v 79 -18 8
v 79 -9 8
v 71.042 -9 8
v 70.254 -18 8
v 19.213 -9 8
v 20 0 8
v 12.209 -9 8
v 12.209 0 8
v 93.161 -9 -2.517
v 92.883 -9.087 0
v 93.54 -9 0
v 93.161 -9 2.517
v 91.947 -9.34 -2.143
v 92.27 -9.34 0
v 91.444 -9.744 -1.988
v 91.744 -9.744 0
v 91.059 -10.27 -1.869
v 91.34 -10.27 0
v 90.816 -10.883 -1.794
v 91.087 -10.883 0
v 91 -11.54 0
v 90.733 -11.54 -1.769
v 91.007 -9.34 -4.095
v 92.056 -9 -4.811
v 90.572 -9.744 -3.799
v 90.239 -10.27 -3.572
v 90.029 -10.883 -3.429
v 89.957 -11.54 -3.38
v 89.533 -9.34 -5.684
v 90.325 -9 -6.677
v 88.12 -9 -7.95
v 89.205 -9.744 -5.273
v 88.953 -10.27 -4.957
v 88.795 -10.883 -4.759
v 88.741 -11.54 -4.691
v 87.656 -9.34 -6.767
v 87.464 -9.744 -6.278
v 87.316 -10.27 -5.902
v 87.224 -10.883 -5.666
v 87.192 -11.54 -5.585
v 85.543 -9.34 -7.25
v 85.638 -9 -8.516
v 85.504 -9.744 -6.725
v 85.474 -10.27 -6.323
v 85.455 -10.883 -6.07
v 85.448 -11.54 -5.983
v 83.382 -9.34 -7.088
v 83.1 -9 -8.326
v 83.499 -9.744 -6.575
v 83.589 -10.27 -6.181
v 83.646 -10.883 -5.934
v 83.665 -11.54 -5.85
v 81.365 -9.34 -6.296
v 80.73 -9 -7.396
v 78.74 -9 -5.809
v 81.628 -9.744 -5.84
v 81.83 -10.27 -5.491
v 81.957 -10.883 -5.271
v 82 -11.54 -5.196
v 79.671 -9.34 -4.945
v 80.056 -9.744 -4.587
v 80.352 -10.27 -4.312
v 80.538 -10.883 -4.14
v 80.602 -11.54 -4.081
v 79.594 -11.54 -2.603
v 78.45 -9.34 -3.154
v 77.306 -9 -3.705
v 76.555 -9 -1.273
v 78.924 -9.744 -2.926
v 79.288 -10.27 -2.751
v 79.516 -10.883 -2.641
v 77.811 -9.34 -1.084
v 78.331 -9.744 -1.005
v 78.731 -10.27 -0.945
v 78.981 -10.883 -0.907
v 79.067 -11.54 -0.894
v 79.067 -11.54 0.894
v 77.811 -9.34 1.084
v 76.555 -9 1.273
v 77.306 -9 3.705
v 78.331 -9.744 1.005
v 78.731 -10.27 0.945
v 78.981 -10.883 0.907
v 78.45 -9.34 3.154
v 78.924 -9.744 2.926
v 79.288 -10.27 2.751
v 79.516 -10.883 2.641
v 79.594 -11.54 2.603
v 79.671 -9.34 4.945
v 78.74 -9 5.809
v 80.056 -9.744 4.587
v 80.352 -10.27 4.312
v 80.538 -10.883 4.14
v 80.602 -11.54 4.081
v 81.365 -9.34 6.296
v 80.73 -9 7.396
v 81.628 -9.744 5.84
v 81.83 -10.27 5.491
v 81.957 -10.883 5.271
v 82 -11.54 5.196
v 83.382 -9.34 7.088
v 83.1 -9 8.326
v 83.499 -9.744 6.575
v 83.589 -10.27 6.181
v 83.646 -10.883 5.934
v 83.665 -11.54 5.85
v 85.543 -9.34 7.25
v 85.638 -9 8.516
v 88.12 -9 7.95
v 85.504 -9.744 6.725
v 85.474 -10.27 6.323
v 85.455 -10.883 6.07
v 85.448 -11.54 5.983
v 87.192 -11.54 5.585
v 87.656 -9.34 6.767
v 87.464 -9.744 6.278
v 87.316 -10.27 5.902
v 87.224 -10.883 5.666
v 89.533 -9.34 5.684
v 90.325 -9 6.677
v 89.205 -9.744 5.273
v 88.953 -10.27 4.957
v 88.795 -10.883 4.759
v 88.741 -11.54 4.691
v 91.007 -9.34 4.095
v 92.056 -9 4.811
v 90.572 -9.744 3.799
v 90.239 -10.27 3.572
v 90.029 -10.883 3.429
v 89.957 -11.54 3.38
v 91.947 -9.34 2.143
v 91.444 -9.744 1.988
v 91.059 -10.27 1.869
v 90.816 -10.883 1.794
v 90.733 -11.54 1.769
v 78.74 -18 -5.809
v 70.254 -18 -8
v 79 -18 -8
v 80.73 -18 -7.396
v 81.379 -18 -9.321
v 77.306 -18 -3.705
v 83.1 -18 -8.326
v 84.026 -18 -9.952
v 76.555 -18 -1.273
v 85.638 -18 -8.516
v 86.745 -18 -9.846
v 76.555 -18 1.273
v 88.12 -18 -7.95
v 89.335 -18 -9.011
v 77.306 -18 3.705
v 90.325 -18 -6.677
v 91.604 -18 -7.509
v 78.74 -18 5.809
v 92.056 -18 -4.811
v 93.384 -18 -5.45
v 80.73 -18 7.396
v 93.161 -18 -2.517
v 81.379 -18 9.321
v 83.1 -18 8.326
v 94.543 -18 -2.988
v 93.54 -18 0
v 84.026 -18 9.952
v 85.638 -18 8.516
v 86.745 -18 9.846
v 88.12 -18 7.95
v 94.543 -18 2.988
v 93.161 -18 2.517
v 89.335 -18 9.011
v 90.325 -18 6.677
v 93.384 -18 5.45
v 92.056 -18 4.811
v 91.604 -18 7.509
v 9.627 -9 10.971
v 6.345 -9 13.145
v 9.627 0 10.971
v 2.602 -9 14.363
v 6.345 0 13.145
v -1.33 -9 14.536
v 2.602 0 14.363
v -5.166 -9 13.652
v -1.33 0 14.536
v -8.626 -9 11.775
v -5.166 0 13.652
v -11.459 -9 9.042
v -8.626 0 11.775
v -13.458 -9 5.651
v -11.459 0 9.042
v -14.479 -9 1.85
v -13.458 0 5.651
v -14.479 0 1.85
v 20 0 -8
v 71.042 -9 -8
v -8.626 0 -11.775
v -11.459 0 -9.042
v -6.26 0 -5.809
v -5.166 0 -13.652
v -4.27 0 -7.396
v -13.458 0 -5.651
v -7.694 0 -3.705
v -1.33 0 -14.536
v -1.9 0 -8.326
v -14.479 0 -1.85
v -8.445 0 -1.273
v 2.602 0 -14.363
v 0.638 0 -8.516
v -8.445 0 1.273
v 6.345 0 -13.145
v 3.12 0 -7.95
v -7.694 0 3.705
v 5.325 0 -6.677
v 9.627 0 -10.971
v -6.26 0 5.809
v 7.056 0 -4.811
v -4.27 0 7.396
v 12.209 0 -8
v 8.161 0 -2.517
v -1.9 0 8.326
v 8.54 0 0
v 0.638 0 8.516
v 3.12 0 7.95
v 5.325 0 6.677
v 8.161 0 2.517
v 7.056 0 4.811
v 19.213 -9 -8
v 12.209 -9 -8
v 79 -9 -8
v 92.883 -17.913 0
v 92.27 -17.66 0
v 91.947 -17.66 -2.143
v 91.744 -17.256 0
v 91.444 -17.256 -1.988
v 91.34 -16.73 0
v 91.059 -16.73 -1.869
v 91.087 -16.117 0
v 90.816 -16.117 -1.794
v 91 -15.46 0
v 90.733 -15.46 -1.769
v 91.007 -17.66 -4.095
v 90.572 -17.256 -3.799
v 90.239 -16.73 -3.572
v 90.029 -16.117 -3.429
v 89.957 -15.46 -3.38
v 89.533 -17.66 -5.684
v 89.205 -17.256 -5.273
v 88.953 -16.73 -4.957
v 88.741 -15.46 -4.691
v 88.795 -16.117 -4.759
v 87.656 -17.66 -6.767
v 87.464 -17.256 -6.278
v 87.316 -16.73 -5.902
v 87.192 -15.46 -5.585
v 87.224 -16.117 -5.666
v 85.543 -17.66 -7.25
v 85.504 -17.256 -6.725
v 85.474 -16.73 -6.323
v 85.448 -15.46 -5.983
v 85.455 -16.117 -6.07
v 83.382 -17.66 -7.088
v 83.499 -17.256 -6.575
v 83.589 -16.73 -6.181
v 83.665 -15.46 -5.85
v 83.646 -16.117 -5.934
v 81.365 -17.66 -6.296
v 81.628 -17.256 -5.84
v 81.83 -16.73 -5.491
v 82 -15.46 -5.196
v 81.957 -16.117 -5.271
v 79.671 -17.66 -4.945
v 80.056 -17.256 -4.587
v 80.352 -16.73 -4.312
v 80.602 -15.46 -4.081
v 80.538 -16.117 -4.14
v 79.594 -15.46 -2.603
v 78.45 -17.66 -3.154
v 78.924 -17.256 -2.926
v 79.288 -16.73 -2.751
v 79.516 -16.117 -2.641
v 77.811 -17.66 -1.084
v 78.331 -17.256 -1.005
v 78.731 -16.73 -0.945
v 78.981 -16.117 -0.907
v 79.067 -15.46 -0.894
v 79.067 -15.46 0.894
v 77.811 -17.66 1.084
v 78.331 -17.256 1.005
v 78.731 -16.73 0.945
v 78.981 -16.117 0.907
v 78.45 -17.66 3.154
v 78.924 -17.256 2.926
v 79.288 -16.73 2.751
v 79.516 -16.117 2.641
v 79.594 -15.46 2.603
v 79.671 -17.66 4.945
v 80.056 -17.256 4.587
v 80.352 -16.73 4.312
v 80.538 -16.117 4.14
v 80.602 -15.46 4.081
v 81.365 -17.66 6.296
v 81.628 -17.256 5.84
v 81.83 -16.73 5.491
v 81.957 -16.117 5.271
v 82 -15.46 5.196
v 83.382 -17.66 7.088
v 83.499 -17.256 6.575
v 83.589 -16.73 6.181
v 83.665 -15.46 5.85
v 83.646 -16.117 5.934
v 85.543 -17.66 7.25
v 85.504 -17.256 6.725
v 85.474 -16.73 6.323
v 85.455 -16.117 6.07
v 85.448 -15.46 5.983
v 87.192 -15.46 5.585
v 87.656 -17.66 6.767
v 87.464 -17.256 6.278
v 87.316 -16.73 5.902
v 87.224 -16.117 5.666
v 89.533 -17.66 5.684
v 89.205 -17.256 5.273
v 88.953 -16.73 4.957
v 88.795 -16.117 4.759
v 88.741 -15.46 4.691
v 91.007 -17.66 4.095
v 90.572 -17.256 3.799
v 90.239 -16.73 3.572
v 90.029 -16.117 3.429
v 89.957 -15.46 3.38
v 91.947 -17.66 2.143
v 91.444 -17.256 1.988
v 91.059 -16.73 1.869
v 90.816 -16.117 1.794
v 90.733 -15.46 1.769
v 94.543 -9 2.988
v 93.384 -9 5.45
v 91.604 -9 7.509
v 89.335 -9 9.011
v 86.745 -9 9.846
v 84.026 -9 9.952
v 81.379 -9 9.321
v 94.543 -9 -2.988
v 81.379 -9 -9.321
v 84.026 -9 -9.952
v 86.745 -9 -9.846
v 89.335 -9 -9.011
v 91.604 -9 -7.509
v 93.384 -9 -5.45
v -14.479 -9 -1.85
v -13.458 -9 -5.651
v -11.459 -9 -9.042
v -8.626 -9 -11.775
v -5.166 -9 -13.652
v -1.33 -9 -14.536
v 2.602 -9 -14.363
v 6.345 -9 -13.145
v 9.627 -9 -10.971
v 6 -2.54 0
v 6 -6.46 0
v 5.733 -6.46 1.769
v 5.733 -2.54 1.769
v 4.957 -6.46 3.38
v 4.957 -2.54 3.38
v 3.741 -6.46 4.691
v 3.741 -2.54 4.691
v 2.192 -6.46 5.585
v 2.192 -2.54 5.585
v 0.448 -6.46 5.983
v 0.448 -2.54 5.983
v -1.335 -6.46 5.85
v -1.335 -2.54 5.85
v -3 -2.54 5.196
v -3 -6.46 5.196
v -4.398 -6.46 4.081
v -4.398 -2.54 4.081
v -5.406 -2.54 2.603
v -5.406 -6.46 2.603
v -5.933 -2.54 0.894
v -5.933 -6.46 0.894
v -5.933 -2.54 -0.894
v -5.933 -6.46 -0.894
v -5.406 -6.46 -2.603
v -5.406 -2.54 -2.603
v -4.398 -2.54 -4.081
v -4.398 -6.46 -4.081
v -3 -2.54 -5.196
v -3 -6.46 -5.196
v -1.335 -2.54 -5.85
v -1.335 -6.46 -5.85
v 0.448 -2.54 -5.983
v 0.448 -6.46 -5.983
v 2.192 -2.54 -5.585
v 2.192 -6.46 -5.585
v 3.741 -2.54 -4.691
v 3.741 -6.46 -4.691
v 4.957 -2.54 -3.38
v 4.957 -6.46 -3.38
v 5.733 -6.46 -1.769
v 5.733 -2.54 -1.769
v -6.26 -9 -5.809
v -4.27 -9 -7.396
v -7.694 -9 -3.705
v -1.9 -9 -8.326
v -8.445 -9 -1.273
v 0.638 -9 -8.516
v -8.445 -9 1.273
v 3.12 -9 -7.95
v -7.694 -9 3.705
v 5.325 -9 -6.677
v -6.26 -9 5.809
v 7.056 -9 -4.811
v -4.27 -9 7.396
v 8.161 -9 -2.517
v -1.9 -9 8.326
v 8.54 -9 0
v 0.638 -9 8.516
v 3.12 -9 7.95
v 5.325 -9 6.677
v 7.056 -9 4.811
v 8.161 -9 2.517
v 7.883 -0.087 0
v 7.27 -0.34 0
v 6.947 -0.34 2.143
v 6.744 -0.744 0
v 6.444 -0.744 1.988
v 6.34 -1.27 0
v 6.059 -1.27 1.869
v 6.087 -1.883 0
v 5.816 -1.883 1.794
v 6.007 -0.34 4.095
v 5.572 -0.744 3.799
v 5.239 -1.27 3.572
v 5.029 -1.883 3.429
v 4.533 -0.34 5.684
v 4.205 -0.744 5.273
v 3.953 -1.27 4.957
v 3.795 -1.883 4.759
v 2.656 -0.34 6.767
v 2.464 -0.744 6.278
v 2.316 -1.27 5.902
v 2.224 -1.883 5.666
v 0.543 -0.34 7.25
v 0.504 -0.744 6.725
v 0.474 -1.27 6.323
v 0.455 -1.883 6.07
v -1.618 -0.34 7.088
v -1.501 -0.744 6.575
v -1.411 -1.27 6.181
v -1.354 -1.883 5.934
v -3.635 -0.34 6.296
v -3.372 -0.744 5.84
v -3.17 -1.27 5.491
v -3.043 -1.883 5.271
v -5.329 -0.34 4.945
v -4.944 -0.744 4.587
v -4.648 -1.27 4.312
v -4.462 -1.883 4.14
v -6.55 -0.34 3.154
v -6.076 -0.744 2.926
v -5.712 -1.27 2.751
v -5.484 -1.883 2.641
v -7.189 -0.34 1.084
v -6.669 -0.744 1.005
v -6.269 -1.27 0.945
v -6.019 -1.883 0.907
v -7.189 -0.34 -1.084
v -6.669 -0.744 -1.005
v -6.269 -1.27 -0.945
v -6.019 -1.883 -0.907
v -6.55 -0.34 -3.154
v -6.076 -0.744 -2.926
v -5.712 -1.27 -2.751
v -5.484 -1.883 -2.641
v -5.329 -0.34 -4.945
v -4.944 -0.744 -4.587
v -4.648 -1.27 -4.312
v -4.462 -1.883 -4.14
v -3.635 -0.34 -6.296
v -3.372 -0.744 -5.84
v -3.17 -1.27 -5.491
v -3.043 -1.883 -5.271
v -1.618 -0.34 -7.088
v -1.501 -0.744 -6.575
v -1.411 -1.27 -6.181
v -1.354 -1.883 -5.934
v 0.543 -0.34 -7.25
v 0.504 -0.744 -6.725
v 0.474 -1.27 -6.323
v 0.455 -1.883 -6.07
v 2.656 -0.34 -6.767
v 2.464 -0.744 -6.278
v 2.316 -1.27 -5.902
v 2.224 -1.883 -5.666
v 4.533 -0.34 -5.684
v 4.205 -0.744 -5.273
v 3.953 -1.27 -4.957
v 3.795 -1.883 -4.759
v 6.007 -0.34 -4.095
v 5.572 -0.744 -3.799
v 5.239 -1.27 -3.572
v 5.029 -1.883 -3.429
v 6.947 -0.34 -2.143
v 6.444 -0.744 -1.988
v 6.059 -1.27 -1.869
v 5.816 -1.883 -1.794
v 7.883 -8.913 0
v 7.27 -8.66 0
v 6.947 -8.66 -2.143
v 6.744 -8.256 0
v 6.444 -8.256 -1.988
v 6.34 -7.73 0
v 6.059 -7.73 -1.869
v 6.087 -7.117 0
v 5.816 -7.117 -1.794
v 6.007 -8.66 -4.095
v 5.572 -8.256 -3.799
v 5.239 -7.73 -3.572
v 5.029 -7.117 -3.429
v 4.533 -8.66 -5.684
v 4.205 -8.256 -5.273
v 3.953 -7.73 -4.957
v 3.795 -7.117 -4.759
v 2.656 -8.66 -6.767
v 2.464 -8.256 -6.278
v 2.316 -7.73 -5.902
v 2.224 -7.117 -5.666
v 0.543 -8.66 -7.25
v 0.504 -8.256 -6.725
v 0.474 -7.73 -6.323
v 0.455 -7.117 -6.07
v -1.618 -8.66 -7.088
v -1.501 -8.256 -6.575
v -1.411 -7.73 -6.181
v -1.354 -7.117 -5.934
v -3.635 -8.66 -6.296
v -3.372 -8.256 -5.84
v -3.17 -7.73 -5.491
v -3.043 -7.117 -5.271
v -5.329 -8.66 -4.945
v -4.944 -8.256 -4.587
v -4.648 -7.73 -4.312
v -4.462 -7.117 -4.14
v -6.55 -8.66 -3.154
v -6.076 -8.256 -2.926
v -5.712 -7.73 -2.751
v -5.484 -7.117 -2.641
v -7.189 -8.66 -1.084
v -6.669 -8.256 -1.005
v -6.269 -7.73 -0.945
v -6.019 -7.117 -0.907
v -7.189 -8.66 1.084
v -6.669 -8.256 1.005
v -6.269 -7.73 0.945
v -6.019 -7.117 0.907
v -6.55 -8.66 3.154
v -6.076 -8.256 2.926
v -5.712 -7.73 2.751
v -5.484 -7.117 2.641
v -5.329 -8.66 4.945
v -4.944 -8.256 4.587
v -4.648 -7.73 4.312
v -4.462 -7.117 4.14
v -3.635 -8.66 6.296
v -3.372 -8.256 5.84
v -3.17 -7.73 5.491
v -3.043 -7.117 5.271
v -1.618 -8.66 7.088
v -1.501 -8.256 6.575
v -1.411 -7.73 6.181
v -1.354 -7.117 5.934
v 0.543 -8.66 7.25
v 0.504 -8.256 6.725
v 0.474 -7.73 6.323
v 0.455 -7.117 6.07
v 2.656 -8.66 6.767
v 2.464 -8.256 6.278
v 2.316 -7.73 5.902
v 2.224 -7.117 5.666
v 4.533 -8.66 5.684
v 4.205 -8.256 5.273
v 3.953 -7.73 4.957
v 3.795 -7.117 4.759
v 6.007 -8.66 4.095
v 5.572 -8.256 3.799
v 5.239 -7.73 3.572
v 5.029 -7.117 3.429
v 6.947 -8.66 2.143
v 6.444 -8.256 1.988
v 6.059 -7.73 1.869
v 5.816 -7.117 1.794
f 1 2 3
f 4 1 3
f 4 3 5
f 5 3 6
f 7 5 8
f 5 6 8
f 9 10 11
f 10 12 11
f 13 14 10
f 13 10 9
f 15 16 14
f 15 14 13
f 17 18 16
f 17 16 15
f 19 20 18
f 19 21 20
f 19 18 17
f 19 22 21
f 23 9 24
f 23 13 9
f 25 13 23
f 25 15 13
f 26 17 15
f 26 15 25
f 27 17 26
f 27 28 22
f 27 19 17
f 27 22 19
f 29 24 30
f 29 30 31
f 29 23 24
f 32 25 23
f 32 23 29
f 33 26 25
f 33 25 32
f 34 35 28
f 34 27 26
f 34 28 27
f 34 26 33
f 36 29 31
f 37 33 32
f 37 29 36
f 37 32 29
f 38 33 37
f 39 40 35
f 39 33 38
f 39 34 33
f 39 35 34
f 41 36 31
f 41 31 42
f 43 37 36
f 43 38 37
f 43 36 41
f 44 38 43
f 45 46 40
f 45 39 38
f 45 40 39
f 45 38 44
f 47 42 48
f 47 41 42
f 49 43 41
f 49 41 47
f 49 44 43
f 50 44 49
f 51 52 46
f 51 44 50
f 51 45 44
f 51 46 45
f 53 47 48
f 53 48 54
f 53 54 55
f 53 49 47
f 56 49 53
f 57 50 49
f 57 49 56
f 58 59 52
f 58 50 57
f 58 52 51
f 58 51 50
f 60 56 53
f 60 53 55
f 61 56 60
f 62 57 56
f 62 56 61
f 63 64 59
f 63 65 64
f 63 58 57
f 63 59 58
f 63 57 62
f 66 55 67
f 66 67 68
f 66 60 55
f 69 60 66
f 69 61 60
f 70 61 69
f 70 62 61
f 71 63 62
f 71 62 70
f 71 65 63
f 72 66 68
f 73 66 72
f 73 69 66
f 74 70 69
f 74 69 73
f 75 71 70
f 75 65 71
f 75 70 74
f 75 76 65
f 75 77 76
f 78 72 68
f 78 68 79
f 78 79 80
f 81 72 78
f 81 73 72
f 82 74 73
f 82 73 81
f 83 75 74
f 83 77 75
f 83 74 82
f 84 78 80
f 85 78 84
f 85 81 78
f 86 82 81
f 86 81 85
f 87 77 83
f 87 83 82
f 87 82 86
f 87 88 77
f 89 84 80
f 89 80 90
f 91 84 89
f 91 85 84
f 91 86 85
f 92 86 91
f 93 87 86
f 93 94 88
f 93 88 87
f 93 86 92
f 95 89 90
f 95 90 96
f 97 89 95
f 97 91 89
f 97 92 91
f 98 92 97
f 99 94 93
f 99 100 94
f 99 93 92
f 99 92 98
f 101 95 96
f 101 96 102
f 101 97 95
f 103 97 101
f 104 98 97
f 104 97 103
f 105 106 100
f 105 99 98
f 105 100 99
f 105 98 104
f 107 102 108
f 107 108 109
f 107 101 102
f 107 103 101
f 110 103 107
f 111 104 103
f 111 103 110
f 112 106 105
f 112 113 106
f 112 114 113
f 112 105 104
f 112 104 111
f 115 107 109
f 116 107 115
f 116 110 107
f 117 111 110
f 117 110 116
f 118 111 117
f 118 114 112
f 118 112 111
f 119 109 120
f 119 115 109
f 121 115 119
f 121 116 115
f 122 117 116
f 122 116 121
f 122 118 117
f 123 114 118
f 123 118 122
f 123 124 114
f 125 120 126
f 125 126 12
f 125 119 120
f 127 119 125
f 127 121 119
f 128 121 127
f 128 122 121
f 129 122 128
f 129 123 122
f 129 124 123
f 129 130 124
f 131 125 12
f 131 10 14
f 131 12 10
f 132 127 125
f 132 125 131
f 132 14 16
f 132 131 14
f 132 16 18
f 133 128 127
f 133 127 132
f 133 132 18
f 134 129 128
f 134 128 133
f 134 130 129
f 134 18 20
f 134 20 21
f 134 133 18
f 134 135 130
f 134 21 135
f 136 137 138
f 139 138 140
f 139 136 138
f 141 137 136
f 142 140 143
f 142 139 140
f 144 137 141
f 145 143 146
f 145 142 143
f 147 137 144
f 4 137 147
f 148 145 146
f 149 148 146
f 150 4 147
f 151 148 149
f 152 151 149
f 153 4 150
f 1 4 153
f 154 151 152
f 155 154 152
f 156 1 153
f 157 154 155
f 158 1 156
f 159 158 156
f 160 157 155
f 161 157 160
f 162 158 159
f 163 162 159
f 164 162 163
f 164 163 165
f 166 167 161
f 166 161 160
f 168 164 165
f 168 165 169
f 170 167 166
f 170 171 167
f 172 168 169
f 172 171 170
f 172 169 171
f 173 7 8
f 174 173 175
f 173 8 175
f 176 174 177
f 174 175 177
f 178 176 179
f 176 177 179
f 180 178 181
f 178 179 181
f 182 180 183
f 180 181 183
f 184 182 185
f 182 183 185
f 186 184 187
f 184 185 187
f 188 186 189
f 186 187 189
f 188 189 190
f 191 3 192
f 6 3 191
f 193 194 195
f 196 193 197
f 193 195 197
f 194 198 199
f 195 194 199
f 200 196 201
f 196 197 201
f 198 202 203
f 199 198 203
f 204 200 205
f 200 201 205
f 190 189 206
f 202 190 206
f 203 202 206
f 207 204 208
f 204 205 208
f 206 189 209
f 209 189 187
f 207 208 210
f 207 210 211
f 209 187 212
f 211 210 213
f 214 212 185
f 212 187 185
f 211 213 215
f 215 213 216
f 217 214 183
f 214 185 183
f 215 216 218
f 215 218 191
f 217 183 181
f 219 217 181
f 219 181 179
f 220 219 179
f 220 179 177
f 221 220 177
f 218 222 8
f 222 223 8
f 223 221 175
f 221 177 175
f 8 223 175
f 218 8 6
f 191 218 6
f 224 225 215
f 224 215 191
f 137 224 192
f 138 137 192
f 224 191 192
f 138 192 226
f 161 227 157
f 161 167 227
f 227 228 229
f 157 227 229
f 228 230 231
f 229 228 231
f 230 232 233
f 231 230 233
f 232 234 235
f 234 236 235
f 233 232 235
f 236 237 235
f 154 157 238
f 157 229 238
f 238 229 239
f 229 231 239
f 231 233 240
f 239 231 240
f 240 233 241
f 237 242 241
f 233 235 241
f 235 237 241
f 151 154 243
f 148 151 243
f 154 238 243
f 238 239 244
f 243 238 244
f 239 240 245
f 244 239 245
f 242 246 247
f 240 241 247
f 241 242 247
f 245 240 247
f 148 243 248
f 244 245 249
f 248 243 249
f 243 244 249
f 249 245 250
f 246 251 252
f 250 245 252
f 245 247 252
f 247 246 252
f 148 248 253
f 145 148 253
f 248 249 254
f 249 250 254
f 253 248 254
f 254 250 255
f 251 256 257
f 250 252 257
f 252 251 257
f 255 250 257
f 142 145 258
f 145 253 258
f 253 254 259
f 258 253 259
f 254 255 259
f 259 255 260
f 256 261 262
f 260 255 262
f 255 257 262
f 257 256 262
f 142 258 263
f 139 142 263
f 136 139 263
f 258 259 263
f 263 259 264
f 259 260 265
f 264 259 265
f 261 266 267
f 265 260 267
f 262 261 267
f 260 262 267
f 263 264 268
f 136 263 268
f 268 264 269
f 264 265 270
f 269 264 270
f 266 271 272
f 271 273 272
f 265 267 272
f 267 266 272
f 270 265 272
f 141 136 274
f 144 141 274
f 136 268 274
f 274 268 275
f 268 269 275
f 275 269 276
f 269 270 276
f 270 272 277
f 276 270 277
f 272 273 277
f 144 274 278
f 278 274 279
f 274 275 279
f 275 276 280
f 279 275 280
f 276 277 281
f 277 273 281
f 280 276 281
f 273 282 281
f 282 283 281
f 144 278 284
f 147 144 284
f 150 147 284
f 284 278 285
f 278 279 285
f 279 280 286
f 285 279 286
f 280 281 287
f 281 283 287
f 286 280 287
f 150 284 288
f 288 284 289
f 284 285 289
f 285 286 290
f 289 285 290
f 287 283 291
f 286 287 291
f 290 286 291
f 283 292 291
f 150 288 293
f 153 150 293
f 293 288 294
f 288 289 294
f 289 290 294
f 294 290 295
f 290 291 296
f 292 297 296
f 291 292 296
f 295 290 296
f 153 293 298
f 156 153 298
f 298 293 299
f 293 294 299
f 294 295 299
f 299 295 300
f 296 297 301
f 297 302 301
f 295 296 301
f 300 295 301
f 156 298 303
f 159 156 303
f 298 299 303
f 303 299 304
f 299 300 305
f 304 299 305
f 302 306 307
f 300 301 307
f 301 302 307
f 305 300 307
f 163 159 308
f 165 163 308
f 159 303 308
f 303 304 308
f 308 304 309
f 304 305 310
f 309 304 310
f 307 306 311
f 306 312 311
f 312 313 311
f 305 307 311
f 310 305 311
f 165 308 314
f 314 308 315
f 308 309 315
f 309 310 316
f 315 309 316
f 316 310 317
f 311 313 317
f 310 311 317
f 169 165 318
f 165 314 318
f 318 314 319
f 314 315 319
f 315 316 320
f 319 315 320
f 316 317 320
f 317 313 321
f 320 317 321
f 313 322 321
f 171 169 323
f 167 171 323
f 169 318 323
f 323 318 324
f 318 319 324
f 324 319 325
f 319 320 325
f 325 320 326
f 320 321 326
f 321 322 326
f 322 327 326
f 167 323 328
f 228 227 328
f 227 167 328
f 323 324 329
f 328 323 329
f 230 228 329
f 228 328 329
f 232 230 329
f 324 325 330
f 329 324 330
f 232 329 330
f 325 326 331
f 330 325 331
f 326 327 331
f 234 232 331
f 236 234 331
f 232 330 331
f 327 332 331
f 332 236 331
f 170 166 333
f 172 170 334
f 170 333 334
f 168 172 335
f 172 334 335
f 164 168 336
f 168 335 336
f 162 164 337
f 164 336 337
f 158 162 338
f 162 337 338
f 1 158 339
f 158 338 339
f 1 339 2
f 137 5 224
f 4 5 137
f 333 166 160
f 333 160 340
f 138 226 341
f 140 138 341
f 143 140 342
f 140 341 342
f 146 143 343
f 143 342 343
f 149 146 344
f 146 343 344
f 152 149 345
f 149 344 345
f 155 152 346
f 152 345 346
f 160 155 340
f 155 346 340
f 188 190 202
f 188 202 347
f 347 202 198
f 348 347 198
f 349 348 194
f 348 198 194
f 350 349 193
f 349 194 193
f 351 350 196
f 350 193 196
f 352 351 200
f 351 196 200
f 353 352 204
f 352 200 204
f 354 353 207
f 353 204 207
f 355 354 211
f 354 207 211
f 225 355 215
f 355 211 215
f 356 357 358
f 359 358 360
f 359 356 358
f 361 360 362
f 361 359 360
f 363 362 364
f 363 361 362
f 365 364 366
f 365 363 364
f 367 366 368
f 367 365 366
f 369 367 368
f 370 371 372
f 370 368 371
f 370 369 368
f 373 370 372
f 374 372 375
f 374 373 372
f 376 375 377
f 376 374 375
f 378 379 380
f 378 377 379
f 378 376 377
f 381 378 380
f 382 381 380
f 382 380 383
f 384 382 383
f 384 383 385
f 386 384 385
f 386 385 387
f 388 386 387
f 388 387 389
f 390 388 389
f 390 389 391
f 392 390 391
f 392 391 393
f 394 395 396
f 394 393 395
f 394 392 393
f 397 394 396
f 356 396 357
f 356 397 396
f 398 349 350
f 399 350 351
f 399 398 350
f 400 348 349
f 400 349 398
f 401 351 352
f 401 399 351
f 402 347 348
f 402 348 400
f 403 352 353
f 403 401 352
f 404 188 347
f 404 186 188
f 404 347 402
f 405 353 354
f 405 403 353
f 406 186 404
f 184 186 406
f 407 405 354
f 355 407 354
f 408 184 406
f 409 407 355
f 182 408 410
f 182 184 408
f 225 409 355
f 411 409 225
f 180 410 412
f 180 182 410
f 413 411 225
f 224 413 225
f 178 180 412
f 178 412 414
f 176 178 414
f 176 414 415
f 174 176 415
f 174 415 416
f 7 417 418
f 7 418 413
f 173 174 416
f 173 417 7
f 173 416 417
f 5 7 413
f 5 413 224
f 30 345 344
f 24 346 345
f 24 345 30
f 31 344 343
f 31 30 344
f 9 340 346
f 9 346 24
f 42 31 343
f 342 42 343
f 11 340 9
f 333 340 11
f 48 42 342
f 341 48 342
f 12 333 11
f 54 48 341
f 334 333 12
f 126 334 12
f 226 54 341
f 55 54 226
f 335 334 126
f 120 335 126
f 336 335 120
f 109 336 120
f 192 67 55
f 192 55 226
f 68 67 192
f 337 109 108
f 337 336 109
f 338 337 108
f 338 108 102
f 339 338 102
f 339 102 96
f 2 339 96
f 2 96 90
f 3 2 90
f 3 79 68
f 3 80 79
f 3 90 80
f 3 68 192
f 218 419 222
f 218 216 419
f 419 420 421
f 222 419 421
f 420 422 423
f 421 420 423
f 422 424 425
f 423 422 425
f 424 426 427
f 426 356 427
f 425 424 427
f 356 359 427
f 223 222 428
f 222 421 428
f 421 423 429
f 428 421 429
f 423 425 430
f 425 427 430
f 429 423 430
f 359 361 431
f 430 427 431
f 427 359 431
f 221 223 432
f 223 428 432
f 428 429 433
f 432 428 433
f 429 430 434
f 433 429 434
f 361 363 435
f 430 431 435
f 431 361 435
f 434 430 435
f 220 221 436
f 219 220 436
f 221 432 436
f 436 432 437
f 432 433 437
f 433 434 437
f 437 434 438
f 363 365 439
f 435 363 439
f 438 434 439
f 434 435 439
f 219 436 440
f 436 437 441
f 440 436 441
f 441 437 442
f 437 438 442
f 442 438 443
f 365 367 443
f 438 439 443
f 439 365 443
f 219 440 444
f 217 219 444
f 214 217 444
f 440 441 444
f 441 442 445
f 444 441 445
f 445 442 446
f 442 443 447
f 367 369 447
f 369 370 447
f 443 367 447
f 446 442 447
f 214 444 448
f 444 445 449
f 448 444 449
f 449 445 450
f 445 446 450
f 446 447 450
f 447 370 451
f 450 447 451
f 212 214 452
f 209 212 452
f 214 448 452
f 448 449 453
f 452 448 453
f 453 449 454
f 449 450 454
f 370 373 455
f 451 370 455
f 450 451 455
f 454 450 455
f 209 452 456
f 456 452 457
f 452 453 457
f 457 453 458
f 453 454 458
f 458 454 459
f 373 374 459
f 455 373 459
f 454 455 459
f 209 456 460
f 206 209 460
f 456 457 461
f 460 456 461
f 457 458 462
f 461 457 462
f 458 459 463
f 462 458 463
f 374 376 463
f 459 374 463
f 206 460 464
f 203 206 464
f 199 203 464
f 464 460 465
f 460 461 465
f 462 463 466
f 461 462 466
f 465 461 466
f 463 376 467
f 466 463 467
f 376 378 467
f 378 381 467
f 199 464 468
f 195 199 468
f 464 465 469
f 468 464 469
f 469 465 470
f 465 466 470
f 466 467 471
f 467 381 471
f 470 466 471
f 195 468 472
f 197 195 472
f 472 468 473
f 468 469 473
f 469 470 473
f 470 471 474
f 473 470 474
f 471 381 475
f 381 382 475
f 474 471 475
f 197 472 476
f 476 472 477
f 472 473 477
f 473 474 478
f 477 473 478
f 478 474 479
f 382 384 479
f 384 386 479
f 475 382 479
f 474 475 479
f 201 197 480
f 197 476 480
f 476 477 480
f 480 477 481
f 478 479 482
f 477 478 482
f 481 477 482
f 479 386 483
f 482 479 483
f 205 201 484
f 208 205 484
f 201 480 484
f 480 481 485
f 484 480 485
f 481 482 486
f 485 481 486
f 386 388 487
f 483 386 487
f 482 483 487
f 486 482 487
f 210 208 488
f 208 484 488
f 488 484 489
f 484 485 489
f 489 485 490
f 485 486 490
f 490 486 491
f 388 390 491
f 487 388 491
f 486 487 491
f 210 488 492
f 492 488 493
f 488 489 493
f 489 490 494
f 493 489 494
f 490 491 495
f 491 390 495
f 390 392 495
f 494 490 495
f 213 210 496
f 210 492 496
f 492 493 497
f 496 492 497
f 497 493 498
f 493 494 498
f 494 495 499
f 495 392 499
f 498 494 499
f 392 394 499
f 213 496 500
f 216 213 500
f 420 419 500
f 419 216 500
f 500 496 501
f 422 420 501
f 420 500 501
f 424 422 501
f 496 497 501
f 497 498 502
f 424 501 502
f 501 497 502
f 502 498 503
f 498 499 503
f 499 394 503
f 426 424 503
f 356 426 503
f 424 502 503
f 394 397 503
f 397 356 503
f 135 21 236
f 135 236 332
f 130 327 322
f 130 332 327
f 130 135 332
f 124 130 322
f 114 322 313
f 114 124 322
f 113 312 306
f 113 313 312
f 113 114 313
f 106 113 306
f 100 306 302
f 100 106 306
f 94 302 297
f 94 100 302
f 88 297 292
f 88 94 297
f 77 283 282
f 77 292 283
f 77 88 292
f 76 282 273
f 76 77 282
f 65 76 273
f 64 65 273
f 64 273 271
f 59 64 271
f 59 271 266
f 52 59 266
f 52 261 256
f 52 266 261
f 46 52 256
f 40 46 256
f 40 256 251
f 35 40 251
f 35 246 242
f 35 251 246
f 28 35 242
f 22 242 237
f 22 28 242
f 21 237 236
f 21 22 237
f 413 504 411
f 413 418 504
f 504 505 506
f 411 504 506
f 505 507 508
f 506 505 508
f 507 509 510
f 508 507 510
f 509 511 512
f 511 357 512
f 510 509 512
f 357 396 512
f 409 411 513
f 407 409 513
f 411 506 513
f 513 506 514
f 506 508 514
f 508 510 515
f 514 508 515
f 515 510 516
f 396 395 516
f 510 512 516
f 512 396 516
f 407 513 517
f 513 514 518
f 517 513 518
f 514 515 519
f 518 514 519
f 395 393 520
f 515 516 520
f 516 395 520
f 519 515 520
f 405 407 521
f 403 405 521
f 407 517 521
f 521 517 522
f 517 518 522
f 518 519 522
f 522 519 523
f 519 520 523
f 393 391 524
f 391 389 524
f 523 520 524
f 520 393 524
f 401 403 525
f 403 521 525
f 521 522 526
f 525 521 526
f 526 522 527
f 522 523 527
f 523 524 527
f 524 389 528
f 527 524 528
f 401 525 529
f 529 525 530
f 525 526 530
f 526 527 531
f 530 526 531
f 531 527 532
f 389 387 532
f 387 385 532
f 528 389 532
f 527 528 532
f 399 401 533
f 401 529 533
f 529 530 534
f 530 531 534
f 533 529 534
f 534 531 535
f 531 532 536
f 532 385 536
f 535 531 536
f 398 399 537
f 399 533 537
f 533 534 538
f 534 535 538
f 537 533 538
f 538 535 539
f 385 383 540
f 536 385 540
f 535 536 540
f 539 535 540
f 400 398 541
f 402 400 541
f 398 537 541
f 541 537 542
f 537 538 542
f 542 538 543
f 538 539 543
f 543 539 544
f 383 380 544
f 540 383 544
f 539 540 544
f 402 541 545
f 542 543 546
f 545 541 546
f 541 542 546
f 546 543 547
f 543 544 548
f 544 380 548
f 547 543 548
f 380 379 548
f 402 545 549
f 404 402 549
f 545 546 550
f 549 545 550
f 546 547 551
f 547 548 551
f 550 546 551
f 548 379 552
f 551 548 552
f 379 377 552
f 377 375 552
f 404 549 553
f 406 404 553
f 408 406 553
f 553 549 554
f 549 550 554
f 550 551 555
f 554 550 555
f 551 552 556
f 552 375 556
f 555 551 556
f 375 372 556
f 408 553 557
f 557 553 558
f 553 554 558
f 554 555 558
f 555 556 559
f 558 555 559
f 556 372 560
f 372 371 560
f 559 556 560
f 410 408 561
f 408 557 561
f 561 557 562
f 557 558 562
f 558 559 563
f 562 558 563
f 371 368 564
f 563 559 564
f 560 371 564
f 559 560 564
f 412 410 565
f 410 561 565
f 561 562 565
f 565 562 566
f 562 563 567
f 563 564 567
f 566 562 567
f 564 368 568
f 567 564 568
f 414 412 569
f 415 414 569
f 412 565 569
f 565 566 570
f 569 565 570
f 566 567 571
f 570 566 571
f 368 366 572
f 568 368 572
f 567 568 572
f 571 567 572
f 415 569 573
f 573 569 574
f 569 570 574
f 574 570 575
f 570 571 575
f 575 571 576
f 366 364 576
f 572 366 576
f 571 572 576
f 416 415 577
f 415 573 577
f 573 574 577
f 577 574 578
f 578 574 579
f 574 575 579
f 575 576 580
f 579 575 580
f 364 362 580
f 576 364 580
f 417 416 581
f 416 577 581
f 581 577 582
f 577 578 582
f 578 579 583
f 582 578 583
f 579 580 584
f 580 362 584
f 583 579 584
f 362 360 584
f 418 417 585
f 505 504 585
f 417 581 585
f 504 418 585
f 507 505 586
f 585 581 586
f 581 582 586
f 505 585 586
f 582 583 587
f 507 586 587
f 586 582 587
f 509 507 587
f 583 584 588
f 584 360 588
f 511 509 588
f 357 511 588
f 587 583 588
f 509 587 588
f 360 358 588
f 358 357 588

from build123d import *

# Parameters (mm, degrees)
F0_R     = 6
F1_DEPTH = 25
F3_DEPTH = 317.5
F4_R     = 2.54


with BuildPart() as f1:
    # F0 (on Front) → F1 (new body)
    with BuildSketch(Plane.XZ):
        with BuildLine():
            ThreePointArc((12.2088000741, -8), (13.9867667719, -4.1743448012), (14.59639679, 0))
            ThreePointArc((14.59639679, 0), (13.9867667719, 4.1743448012), (12.2088000741, 8))
            ThreePointArc((12.2088000741, 8), (-14.59639679, 0), (12.2088000741, -8))
        make_face()
        Circle(F0_R, mode=Mode.SUBTRACT)
        with BuildLine():
            ThreePointArc((12.2088000741, 8), (13.9867667719, 4.1743448012), (14.59639679, 0))
            ThreePointArc((14.59639679, 0), (13.9867667719, -4.1743448012), (12.2088000741, -8))
            Line((12.2088000741, -8), (79, -8))
            ThreePointArc((79, -8), (75, 0), (79, 8))
            Line((79, 8), (12.2088000741, 8))
        make_face()
        with BuildLine():
            ThreePointArc((95, 0), (89.472135955, 8.94427191), (79, 8))
            ThreePointArc((79, 8), (75, 0), (79, -8))
            ThreePointArc((79, -8), (89.472135955, -8.94427191), (95, 0))
        make_face()
        with Locations((85, 0)):
            Circle(F0_R, mode=Mode.SUBTRACT)
    extrude(amount=F1_DEPTH)

    # F2 (on Top) → F3 (intersect, symmetric)
    with BuildSketch(Plane.XY):
        Polygon((20, 0), (-14.4787151366, 0), (-14.4787151366, -9), (19.2126020283, -9), (70.2541384048, -18), (94.5431698973, -18), (94.5431698973, -9), (71.0415363766, -9), align=None)
    extrude(amount=F3_DEPTH, both=True, mode=Mode.INTERSECT)

    # F4
    f4_edges = [f1.edges().sort_by_distance(p)[0] for p in [
        (-6, -9, 0),
        (79, -18, 0),
        (-6, 0, 0),
        (79, -9, 0),
    ]]
    fillet(f4_edges, radius=F4_R)


solid = f1.part
